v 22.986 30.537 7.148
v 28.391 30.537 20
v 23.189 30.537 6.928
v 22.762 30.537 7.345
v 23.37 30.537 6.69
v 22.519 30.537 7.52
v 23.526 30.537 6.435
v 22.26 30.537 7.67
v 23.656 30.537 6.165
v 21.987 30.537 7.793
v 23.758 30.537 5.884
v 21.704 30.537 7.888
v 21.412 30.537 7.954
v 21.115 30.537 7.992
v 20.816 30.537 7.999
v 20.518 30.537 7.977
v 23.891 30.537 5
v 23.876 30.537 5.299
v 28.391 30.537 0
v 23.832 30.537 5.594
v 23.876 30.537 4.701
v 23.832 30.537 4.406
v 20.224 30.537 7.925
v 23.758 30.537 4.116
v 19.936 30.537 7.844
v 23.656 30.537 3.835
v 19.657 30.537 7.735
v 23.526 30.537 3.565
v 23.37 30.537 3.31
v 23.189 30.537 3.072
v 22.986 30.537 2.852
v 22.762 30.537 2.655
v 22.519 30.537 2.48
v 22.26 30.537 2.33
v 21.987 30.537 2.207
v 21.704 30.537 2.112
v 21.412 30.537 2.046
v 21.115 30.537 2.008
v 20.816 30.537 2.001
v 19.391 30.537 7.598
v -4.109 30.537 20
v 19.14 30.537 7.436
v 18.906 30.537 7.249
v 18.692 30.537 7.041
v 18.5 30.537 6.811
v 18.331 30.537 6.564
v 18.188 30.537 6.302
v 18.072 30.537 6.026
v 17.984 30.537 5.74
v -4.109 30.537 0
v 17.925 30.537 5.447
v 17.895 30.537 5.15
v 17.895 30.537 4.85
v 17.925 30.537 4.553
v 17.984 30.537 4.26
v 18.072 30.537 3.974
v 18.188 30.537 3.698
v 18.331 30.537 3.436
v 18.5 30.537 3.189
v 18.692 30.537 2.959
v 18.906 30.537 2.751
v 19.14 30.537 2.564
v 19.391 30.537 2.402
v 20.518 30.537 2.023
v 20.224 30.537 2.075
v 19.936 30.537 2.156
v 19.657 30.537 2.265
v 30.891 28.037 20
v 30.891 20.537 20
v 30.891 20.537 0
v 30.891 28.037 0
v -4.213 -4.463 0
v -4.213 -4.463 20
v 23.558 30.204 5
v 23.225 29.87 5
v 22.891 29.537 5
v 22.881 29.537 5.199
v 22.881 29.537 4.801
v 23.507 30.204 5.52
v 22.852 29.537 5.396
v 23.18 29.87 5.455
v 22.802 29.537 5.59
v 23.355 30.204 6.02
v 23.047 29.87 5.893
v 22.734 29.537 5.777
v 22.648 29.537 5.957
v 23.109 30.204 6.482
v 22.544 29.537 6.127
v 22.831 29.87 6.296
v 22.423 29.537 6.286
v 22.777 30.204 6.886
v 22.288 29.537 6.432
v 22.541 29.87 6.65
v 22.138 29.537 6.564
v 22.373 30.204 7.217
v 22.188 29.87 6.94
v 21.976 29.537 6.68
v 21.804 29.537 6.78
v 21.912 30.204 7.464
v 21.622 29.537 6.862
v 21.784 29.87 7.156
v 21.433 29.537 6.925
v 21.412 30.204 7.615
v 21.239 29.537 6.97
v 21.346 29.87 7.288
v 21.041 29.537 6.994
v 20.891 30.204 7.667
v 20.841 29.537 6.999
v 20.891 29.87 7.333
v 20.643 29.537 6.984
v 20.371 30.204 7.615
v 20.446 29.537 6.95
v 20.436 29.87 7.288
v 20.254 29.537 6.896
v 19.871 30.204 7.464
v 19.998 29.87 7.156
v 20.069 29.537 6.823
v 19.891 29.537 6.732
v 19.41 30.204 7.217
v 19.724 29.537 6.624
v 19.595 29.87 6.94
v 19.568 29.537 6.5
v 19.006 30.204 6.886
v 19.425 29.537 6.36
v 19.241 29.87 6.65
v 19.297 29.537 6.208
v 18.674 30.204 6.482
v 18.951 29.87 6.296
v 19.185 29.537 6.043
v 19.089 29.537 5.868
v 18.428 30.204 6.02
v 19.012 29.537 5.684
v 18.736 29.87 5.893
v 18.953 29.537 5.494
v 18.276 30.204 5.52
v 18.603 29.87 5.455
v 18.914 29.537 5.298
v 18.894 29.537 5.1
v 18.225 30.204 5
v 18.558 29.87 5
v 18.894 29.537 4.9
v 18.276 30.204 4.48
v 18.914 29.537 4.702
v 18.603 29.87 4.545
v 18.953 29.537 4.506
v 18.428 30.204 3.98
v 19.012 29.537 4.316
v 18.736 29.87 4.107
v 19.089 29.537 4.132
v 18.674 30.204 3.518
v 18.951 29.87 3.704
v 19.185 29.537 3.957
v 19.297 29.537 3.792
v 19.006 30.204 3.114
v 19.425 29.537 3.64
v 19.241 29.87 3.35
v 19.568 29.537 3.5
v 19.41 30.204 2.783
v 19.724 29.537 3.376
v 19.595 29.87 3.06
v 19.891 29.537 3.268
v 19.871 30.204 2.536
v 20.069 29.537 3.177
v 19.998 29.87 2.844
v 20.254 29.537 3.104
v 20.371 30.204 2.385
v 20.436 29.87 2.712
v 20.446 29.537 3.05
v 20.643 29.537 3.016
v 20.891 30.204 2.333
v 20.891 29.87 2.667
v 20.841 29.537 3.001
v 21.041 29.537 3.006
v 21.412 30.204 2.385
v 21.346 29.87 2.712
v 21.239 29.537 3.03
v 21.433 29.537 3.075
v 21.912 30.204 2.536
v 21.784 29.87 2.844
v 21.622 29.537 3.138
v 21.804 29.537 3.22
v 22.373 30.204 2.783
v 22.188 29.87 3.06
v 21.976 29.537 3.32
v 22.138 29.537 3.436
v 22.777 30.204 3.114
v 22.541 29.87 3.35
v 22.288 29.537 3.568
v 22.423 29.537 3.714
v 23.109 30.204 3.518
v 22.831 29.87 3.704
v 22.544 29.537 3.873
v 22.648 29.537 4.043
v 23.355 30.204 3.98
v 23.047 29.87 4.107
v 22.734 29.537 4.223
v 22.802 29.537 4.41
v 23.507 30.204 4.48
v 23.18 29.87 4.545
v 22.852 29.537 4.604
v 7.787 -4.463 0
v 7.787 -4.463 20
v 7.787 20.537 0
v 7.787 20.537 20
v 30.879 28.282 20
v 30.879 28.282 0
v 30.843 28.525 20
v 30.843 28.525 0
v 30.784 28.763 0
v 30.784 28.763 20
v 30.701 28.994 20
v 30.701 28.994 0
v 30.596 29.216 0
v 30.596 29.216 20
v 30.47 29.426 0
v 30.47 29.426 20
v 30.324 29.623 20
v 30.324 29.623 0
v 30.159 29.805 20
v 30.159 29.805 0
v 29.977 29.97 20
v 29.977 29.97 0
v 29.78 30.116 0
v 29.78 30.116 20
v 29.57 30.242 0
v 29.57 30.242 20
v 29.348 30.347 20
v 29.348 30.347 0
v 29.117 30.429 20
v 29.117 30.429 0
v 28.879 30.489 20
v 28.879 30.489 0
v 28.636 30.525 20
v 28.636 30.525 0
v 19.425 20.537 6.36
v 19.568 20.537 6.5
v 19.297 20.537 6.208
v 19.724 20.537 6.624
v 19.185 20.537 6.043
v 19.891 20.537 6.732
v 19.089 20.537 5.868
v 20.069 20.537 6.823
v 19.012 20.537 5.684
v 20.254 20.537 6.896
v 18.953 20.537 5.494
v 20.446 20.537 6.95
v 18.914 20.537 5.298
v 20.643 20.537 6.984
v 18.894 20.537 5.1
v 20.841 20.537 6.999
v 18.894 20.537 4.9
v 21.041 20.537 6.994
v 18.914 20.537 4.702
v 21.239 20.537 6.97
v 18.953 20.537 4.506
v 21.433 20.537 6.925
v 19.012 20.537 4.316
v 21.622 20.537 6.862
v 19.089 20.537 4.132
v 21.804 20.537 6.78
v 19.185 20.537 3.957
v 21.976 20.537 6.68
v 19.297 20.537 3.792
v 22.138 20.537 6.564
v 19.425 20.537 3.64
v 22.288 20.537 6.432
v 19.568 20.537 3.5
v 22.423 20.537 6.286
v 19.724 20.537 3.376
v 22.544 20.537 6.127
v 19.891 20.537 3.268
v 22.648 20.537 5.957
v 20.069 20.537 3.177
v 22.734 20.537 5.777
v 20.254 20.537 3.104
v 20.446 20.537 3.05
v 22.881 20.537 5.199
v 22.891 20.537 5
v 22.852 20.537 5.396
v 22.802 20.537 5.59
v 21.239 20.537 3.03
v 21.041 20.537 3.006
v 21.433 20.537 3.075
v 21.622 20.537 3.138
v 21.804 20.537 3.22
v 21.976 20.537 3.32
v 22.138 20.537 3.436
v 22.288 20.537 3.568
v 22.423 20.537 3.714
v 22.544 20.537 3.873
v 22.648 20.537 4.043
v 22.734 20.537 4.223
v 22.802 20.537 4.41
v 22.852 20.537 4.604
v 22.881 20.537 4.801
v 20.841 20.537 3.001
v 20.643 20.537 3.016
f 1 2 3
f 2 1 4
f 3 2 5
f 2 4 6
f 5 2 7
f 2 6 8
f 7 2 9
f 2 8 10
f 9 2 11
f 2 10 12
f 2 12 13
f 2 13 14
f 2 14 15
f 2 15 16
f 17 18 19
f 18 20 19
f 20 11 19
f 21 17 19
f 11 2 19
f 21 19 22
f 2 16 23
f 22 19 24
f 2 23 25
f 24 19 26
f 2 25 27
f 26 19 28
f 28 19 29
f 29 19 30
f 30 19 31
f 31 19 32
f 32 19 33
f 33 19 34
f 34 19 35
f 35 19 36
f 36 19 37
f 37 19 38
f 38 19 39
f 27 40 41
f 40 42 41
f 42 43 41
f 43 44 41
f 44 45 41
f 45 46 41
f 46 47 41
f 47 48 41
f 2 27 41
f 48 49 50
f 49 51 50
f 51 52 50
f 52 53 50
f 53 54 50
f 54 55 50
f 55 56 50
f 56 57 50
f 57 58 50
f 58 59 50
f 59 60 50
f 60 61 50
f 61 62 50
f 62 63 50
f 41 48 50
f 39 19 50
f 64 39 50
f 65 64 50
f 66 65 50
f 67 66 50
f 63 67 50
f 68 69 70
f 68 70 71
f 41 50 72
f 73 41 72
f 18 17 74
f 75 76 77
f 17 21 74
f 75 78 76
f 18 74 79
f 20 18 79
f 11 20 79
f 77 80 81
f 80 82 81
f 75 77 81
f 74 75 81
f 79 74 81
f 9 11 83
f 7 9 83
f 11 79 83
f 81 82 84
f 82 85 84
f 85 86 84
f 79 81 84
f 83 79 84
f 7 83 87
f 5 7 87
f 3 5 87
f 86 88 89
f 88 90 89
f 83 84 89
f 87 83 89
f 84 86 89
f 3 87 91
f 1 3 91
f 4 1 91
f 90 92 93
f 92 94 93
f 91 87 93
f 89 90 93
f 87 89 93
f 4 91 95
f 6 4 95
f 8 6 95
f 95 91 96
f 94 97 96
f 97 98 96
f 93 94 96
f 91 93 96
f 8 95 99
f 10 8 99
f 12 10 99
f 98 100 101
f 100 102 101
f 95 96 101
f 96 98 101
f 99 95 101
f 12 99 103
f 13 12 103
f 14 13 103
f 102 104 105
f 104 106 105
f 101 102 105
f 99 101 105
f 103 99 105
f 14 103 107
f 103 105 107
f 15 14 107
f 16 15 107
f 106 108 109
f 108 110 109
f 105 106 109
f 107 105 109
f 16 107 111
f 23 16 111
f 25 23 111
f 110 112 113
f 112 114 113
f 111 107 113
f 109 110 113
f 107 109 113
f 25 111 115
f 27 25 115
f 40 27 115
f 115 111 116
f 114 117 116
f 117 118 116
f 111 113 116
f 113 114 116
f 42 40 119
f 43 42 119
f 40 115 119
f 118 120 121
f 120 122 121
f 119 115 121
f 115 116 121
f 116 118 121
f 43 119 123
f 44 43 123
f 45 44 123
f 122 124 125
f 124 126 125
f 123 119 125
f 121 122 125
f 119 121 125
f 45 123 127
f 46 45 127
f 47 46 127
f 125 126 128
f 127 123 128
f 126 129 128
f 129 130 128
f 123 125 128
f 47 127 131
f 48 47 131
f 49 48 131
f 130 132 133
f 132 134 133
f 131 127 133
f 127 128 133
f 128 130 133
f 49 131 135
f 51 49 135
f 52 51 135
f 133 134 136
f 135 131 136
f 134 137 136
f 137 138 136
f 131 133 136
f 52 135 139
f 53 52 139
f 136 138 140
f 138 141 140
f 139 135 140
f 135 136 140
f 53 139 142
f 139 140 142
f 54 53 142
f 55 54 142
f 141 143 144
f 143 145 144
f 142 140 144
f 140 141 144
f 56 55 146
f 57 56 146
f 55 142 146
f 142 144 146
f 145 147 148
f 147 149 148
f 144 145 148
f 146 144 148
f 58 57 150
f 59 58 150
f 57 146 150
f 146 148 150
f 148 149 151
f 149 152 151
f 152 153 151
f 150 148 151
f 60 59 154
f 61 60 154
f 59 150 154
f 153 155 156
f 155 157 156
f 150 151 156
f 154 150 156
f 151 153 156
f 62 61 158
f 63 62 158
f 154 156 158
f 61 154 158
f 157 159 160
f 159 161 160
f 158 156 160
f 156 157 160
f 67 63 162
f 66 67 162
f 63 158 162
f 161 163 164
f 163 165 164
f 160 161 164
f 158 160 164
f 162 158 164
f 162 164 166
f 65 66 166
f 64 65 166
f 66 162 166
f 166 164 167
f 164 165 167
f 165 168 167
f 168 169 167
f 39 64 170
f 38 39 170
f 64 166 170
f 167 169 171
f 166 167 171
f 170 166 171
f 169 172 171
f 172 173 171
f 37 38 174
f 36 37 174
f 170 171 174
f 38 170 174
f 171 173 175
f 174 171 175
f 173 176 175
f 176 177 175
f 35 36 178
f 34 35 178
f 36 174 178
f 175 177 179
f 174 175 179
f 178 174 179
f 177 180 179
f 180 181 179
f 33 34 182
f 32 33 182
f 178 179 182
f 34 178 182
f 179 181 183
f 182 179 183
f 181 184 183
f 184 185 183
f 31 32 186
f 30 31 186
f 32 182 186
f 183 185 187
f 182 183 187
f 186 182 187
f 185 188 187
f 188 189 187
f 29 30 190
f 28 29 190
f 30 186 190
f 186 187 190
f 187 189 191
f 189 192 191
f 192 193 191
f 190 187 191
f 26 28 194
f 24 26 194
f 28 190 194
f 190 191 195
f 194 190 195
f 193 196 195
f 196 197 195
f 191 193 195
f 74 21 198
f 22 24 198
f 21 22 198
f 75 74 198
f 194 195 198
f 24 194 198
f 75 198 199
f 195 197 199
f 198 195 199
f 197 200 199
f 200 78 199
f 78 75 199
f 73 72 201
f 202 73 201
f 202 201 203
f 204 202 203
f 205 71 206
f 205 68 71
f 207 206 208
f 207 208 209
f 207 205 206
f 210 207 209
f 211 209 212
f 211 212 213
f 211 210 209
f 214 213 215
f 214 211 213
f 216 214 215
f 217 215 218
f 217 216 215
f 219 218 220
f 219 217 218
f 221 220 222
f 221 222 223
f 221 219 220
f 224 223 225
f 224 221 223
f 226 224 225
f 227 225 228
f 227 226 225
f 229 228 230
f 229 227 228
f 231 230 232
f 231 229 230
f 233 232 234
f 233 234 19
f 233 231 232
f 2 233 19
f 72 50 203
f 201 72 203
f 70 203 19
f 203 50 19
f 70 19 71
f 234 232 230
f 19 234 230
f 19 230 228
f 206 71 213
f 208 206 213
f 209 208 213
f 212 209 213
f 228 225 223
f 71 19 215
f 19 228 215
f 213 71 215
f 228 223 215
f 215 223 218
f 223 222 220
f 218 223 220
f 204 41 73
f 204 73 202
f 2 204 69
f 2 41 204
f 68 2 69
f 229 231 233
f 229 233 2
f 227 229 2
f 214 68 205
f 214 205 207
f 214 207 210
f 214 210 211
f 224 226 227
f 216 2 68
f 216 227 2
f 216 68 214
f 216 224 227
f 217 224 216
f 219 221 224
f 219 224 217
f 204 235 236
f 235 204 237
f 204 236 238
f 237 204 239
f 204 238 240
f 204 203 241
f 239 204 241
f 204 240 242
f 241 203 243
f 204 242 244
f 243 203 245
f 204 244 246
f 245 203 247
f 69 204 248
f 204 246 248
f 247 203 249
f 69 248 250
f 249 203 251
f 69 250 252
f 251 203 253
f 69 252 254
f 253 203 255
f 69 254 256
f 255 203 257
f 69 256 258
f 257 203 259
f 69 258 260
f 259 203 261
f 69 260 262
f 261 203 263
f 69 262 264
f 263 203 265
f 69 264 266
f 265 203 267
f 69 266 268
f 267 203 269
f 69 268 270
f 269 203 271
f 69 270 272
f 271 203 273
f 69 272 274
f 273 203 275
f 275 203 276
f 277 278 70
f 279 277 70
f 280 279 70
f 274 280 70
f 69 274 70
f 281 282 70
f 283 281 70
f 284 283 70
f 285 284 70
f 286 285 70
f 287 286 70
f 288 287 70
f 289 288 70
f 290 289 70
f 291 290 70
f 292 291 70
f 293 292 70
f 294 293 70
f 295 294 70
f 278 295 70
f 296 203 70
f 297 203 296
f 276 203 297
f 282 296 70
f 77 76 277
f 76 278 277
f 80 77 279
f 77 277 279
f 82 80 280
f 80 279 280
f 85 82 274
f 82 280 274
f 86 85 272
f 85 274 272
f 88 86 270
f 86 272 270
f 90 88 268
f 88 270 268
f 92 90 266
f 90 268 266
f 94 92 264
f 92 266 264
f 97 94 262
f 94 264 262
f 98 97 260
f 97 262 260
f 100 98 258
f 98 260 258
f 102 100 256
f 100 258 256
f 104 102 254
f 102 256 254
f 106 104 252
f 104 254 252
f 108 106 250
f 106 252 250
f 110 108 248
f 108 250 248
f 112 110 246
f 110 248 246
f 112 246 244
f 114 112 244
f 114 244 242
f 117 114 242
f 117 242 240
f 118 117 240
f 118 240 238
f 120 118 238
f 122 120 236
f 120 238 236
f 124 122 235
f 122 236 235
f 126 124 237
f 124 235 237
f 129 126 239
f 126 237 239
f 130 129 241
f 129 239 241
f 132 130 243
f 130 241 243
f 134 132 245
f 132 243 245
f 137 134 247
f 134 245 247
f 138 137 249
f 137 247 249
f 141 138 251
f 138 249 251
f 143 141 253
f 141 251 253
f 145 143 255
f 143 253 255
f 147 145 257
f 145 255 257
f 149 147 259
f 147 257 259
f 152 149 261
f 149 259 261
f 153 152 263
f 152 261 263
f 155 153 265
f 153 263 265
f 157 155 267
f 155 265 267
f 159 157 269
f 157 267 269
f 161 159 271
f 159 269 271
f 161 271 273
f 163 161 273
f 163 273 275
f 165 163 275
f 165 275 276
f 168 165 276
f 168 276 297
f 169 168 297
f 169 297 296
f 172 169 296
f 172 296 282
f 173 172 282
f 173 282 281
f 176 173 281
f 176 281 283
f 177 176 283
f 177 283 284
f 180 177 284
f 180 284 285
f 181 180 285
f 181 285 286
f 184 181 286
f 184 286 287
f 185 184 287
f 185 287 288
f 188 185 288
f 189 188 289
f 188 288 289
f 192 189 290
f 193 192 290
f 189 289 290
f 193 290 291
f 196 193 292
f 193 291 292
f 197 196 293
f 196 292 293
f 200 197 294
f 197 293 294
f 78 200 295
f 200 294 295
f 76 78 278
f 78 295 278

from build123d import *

# Parameters (mm, degrees)
F1_DEPTH       = 20
F3_D           = 4
F3_CSINK_D     = 6
F3_CSINK_ANGLE = 90
F4_R           = 2.5


with BuildPart() as f1:
    # F0 (on Top) → F1 (new body)
    with BuildSketch(Plane.XY):
        Polygon((-4.108734, 30.537107), (-4.213165, -4.462893), (7.786835, -4.462893), (7.786835, 20.537107), (30.891266, 20.537107), (30.891266, 30.537107), align=None)
    extrude(amount=F1_DEPTH)

    # F3 (through all)
    with Locations(Plane(origin=(0, 30.537107, 0), x_dir=(-1, 0, 0), z_dir=(0, 1, 0))):
        with Locations((-20.891266, 5)):
            CounterSinkHole(F3_D / 2, F3_CSINK_D / 2, counter_sink_angle=F3_CSINK_ANGLE)

    # F4
    f4_edges = [f1.edges().sort_by_distance(p)[0] for p in [
        (30.891266, 30.537107, 10),
    ]]
    fillet(f4_edges, radius=F4_R)


solid = f1.part
